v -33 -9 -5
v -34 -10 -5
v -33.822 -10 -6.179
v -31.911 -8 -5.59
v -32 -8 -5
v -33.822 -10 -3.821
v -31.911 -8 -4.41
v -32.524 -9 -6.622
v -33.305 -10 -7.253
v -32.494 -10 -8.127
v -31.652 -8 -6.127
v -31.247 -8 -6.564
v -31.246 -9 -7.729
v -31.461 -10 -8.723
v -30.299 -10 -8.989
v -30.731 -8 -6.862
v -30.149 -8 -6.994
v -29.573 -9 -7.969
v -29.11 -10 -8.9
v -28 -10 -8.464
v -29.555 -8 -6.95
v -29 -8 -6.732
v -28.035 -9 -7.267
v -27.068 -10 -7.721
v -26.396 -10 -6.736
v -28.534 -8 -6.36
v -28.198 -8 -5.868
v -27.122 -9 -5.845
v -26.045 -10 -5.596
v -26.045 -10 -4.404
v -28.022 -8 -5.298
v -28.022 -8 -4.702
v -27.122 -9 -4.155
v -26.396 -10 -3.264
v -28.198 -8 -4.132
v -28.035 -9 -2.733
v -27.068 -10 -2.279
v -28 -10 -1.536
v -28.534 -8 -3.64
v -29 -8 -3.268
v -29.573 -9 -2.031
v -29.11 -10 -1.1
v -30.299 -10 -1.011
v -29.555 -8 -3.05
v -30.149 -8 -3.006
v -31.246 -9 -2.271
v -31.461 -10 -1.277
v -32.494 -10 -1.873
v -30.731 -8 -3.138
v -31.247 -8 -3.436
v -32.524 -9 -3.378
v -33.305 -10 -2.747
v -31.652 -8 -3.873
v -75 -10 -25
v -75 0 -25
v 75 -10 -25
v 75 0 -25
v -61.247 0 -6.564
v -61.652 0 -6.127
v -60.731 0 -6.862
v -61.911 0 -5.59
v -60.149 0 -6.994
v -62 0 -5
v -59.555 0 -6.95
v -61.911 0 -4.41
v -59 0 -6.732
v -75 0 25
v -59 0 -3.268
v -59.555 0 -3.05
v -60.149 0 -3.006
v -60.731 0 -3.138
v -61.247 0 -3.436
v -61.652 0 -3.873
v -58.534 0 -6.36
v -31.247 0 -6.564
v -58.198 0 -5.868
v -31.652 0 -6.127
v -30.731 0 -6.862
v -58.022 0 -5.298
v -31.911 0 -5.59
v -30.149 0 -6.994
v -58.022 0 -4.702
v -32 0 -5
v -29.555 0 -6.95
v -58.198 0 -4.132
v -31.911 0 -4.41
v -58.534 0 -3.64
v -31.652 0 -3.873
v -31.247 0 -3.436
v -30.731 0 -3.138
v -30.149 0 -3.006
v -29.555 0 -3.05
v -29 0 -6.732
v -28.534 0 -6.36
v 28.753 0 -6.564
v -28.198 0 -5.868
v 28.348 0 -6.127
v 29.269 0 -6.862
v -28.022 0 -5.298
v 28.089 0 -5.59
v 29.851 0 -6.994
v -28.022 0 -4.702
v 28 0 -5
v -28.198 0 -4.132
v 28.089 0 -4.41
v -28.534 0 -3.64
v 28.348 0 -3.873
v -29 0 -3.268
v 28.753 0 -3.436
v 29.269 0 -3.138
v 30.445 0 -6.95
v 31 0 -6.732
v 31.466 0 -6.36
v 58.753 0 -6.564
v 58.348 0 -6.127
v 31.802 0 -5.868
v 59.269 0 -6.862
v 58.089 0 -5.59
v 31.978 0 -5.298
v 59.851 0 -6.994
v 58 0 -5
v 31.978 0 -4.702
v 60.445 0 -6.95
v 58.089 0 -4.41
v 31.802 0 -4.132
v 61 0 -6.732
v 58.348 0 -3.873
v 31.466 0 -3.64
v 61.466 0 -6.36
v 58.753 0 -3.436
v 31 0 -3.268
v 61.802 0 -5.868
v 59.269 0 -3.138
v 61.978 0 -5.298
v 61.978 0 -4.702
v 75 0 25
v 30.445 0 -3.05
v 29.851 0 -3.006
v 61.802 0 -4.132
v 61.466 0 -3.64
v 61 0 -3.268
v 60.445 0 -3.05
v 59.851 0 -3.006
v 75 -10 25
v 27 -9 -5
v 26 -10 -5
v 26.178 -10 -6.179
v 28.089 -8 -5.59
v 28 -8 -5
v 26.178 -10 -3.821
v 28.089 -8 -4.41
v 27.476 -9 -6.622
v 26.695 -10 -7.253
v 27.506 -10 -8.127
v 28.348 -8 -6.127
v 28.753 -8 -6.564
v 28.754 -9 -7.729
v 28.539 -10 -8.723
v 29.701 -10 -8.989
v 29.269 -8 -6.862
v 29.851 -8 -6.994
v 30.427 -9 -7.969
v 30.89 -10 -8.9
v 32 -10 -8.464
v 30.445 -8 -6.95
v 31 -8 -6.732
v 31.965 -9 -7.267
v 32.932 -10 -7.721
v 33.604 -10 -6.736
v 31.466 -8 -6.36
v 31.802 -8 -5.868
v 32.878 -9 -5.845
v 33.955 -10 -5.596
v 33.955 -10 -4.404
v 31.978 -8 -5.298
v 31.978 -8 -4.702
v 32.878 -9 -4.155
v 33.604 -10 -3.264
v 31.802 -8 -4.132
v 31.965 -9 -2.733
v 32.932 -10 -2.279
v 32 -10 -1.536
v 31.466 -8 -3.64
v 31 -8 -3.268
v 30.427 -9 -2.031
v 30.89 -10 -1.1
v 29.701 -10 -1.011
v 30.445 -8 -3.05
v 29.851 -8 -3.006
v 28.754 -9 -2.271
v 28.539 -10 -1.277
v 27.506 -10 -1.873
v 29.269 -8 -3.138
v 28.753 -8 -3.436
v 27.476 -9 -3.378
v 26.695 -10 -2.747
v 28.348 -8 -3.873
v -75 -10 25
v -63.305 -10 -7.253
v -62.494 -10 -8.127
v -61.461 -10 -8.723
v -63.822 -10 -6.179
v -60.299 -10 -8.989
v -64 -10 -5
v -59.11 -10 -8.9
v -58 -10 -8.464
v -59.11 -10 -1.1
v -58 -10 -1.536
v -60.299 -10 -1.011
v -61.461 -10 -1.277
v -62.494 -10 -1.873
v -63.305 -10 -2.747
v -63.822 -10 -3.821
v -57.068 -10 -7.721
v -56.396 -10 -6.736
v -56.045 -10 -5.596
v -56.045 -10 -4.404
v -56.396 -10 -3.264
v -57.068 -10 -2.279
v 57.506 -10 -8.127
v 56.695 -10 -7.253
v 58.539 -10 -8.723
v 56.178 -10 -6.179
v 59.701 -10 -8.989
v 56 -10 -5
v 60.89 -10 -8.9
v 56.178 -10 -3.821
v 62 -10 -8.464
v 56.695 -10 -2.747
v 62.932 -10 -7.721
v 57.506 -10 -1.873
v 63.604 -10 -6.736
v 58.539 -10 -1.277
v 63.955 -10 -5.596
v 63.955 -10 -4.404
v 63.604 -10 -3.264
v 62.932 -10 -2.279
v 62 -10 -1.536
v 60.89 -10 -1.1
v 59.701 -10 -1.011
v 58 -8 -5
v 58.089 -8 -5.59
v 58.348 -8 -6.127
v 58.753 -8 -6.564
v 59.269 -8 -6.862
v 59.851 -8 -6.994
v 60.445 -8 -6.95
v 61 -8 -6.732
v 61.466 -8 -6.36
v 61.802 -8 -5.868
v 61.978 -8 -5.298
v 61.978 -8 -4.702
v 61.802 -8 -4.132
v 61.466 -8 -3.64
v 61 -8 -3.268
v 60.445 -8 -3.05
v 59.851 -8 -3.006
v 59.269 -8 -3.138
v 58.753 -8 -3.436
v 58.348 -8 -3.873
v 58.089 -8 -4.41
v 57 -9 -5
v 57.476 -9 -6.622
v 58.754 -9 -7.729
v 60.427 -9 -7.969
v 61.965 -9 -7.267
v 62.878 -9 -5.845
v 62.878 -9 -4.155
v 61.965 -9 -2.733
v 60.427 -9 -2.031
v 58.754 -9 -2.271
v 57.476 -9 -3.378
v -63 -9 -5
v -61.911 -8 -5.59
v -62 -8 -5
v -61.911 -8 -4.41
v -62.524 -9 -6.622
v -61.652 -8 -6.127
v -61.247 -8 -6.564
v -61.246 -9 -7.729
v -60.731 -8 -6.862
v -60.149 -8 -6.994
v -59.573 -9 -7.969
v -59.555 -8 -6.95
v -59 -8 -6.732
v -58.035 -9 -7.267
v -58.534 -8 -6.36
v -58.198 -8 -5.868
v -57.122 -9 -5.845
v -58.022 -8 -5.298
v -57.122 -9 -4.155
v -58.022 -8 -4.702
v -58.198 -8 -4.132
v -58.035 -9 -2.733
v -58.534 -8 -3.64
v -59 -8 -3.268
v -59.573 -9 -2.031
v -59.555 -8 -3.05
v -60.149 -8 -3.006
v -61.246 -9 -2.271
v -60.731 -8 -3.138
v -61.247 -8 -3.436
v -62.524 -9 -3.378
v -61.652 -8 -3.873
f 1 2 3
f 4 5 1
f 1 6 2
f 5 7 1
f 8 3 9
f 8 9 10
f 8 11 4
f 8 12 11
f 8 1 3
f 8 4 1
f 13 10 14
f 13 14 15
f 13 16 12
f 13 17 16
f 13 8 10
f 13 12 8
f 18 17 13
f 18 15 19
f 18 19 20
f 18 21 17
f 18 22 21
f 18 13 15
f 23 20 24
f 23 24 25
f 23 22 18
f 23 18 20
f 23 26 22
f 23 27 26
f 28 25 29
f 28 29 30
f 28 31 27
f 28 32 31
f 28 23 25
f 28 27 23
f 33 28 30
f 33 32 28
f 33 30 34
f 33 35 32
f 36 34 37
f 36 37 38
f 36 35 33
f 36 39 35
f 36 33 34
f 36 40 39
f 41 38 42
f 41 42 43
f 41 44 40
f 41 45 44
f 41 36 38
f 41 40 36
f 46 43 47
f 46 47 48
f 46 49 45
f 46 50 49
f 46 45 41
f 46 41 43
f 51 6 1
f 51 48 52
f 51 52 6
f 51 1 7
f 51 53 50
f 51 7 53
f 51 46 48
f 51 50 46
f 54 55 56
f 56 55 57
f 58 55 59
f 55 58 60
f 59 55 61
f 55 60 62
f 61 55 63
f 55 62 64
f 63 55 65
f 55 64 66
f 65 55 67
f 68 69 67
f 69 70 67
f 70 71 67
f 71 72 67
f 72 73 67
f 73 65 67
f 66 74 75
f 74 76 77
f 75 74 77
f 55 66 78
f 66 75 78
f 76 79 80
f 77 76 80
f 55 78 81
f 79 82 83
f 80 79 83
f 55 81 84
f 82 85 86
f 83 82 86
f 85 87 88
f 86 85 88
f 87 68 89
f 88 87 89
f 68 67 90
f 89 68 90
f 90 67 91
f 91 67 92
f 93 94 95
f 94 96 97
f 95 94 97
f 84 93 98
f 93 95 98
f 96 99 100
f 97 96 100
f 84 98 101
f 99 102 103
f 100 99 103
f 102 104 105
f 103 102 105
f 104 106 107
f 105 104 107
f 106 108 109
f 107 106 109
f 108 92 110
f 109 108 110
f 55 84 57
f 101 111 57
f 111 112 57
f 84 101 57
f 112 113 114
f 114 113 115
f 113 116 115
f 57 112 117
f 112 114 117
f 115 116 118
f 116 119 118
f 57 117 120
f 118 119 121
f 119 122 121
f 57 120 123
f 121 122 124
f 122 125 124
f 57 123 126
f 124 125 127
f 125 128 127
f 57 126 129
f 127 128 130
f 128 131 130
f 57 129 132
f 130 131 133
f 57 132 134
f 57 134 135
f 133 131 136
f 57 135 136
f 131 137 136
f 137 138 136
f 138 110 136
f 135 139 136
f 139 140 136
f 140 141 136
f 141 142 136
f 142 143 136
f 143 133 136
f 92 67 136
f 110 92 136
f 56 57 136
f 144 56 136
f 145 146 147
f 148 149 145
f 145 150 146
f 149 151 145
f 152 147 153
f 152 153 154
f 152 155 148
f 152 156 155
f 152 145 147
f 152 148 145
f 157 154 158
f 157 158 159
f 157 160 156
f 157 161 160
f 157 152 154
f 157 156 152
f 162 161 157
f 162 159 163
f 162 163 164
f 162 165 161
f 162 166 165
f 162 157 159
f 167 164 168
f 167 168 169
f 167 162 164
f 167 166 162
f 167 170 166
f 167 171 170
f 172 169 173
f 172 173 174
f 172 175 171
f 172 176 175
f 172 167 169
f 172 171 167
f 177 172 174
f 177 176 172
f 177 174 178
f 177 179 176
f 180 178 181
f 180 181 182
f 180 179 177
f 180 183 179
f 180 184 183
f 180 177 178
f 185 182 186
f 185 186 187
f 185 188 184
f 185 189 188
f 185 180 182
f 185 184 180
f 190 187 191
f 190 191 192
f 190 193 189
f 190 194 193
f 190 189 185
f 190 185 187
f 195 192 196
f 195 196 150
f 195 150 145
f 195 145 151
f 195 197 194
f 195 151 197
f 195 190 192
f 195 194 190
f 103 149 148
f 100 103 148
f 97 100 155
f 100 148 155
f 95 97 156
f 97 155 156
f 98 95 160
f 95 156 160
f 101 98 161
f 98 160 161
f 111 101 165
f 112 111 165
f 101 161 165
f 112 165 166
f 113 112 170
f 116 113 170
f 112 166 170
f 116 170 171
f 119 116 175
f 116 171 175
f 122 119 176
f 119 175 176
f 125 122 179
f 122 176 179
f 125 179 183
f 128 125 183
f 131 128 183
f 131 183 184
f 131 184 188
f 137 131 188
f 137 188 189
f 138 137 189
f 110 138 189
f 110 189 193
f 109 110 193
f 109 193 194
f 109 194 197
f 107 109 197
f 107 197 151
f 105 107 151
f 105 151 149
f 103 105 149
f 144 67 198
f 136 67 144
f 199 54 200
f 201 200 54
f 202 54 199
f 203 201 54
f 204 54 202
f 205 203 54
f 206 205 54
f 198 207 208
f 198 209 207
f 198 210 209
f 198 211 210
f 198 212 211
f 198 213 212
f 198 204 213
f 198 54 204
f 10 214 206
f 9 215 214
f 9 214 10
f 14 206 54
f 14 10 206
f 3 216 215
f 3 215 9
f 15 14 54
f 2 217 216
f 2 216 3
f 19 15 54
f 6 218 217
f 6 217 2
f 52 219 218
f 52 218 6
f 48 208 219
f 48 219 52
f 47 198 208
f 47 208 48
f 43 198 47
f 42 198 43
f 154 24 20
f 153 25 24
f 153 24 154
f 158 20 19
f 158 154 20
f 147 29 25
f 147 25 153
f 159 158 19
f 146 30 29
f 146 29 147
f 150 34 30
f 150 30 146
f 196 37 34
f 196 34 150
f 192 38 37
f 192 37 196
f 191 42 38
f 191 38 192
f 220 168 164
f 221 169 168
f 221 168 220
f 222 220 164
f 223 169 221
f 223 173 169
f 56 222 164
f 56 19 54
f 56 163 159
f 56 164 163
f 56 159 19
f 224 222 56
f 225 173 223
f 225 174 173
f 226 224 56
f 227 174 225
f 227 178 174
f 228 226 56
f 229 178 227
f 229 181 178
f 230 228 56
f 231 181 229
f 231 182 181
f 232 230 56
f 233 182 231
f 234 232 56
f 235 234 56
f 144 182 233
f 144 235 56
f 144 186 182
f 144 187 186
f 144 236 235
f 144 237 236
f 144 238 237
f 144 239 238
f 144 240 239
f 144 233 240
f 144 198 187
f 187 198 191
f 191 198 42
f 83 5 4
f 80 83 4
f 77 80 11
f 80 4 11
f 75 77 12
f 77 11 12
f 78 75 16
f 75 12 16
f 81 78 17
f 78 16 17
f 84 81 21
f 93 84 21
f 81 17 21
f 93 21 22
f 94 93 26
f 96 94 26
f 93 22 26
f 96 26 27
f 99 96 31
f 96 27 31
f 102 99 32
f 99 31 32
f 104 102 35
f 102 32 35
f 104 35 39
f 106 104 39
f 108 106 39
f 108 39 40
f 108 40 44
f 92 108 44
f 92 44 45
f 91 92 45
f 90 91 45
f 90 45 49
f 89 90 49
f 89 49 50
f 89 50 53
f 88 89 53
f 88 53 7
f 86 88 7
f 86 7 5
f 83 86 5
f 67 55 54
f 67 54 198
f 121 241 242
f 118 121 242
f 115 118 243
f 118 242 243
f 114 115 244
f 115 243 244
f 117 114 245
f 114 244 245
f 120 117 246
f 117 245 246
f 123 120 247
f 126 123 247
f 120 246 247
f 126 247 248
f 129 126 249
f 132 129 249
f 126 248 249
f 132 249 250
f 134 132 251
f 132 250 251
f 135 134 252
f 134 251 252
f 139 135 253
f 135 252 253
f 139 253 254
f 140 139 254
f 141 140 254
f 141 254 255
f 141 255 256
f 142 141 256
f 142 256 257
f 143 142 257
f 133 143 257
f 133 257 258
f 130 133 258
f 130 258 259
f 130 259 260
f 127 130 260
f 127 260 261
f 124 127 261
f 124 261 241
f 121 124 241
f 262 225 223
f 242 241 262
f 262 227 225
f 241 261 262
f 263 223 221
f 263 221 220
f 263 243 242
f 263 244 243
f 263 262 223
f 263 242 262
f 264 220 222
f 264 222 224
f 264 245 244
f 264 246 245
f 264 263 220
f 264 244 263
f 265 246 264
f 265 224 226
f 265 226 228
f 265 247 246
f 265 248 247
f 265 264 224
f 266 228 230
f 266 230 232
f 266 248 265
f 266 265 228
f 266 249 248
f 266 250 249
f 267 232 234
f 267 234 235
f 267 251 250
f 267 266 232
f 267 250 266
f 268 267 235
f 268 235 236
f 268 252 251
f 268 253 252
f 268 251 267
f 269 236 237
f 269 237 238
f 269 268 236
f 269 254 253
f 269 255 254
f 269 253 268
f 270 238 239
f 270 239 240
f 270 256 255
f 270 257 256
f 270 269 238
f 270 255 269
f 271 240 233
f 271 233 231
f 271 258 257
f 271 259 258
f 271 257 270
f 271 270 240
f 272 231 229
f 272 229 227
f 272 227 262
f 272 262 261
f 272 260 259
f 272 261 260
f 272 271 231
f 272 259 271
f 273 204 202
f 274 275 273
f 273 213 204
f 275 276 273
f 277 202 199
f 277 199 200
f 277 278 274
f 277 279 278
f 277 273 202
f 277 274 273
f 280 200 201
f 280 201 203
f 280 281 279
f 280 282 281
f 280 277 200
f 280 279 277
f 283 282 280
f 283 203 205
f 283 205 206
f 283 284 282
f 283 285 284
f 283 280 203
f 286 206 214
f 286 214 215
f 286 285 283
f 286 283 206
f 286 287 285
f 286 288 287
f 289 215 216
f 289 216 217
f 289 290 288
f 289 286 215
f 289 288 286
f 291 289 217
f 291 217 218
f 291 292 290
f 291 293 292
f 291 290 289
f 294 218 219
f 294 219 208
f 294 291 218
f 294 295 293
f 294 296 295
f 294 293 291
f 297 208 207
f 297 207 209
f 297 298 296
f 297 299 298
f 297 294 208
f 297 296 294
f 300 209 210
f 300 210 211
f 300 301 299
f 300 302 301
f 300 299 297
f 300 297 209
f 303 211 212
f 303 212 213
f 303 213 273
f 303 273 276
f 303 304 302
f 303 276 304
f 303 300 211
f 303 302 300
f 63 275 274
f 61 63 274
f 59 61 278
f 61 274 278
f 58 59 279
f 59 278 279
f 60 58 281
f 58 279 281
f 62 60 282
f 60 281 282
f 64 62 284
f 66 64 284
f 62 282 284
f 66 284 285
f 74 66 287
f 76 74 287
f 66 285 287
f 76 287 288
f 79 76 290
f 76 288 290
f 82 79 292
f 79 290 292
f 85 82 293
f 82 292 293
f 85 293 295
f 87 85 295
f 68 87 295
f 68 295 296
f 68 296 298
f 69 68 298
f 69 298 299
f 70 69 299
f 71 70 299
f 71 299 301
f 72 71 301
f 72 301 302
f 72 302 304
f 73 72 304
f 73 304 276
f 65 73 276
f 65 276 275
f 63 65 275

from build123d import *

# Parameters (mm, degrees)
F0_W     = 150
F0_H     = 50
F1_DEPTH = 10
F3_DEPTH = 10.001
F4_SIZE  = 2


with BuildPart() as f1:
    # F0 (on Front) → F1 (new body)
    with BuildSketch(Plane.XZ):
        Rectangle(F0_W, F0_H)
    extrude(amount=F1_DEPTH)

    # F2 (on face) → F3 (cut, through all)
    with BuildSketch(Plane.XZ.offset(10)):
        with BuildLine():
            ThreePointArc((-28, -5), (-30, -3), (-32, -5))
            Line((-32, -5), (-28, -5))
        make_face()
        with BuildLine():
            Line((-28, -5), (-32, -5))
            ThreePointArc((-32, -5), (-30, -7), (-28, -5))
        make_face()
        with BuildLine():
            ThreePointArc((-58, -5), (-60, -3), (-62, -5))
            Line((-62, -5), (-58, -5))
        make_face()
        with BuildLine():
            Line((-58, -5), (-62, -5))
            ThreePointArc((-62, -5), (-60, -7), (-58, -5))
        make_face()
        with BuildLine():
            ThreePointArc((32, -5), (30, -3), (28, -5))
            Line((28, -5), (32, -5))
        make_face()
        with BuildLine():
            Line((32, -5), (28, -5))
            ThreePointArc((28, -5), (30, -7), (32, -5))
        make_face()
        with BuildLine():
            Line((58, -5), (62, -5))
            ThreePointArc((62, -5), (60, -3), (58, -5))
        make_face()
        with BuildLine():
            ThreePointArc((58, -5), (60, -7), (62, -5))
            Line((62, -5), (58, -5))
        make_face()
    extrude(amount=-F3_DEPTH, mode=Mode.SUBTRACT)

    # F4
    f4_edges = [f1.edges().sort_by_distance(p)[0] for p in [
        (-58, -10, -5),
        (-28, -10, -5),
        (32, -10, -5),
        (62, -10, -5),
    ]]
    chamfer(f4_edges, length=F4_SIZE)


solid = f1.part
